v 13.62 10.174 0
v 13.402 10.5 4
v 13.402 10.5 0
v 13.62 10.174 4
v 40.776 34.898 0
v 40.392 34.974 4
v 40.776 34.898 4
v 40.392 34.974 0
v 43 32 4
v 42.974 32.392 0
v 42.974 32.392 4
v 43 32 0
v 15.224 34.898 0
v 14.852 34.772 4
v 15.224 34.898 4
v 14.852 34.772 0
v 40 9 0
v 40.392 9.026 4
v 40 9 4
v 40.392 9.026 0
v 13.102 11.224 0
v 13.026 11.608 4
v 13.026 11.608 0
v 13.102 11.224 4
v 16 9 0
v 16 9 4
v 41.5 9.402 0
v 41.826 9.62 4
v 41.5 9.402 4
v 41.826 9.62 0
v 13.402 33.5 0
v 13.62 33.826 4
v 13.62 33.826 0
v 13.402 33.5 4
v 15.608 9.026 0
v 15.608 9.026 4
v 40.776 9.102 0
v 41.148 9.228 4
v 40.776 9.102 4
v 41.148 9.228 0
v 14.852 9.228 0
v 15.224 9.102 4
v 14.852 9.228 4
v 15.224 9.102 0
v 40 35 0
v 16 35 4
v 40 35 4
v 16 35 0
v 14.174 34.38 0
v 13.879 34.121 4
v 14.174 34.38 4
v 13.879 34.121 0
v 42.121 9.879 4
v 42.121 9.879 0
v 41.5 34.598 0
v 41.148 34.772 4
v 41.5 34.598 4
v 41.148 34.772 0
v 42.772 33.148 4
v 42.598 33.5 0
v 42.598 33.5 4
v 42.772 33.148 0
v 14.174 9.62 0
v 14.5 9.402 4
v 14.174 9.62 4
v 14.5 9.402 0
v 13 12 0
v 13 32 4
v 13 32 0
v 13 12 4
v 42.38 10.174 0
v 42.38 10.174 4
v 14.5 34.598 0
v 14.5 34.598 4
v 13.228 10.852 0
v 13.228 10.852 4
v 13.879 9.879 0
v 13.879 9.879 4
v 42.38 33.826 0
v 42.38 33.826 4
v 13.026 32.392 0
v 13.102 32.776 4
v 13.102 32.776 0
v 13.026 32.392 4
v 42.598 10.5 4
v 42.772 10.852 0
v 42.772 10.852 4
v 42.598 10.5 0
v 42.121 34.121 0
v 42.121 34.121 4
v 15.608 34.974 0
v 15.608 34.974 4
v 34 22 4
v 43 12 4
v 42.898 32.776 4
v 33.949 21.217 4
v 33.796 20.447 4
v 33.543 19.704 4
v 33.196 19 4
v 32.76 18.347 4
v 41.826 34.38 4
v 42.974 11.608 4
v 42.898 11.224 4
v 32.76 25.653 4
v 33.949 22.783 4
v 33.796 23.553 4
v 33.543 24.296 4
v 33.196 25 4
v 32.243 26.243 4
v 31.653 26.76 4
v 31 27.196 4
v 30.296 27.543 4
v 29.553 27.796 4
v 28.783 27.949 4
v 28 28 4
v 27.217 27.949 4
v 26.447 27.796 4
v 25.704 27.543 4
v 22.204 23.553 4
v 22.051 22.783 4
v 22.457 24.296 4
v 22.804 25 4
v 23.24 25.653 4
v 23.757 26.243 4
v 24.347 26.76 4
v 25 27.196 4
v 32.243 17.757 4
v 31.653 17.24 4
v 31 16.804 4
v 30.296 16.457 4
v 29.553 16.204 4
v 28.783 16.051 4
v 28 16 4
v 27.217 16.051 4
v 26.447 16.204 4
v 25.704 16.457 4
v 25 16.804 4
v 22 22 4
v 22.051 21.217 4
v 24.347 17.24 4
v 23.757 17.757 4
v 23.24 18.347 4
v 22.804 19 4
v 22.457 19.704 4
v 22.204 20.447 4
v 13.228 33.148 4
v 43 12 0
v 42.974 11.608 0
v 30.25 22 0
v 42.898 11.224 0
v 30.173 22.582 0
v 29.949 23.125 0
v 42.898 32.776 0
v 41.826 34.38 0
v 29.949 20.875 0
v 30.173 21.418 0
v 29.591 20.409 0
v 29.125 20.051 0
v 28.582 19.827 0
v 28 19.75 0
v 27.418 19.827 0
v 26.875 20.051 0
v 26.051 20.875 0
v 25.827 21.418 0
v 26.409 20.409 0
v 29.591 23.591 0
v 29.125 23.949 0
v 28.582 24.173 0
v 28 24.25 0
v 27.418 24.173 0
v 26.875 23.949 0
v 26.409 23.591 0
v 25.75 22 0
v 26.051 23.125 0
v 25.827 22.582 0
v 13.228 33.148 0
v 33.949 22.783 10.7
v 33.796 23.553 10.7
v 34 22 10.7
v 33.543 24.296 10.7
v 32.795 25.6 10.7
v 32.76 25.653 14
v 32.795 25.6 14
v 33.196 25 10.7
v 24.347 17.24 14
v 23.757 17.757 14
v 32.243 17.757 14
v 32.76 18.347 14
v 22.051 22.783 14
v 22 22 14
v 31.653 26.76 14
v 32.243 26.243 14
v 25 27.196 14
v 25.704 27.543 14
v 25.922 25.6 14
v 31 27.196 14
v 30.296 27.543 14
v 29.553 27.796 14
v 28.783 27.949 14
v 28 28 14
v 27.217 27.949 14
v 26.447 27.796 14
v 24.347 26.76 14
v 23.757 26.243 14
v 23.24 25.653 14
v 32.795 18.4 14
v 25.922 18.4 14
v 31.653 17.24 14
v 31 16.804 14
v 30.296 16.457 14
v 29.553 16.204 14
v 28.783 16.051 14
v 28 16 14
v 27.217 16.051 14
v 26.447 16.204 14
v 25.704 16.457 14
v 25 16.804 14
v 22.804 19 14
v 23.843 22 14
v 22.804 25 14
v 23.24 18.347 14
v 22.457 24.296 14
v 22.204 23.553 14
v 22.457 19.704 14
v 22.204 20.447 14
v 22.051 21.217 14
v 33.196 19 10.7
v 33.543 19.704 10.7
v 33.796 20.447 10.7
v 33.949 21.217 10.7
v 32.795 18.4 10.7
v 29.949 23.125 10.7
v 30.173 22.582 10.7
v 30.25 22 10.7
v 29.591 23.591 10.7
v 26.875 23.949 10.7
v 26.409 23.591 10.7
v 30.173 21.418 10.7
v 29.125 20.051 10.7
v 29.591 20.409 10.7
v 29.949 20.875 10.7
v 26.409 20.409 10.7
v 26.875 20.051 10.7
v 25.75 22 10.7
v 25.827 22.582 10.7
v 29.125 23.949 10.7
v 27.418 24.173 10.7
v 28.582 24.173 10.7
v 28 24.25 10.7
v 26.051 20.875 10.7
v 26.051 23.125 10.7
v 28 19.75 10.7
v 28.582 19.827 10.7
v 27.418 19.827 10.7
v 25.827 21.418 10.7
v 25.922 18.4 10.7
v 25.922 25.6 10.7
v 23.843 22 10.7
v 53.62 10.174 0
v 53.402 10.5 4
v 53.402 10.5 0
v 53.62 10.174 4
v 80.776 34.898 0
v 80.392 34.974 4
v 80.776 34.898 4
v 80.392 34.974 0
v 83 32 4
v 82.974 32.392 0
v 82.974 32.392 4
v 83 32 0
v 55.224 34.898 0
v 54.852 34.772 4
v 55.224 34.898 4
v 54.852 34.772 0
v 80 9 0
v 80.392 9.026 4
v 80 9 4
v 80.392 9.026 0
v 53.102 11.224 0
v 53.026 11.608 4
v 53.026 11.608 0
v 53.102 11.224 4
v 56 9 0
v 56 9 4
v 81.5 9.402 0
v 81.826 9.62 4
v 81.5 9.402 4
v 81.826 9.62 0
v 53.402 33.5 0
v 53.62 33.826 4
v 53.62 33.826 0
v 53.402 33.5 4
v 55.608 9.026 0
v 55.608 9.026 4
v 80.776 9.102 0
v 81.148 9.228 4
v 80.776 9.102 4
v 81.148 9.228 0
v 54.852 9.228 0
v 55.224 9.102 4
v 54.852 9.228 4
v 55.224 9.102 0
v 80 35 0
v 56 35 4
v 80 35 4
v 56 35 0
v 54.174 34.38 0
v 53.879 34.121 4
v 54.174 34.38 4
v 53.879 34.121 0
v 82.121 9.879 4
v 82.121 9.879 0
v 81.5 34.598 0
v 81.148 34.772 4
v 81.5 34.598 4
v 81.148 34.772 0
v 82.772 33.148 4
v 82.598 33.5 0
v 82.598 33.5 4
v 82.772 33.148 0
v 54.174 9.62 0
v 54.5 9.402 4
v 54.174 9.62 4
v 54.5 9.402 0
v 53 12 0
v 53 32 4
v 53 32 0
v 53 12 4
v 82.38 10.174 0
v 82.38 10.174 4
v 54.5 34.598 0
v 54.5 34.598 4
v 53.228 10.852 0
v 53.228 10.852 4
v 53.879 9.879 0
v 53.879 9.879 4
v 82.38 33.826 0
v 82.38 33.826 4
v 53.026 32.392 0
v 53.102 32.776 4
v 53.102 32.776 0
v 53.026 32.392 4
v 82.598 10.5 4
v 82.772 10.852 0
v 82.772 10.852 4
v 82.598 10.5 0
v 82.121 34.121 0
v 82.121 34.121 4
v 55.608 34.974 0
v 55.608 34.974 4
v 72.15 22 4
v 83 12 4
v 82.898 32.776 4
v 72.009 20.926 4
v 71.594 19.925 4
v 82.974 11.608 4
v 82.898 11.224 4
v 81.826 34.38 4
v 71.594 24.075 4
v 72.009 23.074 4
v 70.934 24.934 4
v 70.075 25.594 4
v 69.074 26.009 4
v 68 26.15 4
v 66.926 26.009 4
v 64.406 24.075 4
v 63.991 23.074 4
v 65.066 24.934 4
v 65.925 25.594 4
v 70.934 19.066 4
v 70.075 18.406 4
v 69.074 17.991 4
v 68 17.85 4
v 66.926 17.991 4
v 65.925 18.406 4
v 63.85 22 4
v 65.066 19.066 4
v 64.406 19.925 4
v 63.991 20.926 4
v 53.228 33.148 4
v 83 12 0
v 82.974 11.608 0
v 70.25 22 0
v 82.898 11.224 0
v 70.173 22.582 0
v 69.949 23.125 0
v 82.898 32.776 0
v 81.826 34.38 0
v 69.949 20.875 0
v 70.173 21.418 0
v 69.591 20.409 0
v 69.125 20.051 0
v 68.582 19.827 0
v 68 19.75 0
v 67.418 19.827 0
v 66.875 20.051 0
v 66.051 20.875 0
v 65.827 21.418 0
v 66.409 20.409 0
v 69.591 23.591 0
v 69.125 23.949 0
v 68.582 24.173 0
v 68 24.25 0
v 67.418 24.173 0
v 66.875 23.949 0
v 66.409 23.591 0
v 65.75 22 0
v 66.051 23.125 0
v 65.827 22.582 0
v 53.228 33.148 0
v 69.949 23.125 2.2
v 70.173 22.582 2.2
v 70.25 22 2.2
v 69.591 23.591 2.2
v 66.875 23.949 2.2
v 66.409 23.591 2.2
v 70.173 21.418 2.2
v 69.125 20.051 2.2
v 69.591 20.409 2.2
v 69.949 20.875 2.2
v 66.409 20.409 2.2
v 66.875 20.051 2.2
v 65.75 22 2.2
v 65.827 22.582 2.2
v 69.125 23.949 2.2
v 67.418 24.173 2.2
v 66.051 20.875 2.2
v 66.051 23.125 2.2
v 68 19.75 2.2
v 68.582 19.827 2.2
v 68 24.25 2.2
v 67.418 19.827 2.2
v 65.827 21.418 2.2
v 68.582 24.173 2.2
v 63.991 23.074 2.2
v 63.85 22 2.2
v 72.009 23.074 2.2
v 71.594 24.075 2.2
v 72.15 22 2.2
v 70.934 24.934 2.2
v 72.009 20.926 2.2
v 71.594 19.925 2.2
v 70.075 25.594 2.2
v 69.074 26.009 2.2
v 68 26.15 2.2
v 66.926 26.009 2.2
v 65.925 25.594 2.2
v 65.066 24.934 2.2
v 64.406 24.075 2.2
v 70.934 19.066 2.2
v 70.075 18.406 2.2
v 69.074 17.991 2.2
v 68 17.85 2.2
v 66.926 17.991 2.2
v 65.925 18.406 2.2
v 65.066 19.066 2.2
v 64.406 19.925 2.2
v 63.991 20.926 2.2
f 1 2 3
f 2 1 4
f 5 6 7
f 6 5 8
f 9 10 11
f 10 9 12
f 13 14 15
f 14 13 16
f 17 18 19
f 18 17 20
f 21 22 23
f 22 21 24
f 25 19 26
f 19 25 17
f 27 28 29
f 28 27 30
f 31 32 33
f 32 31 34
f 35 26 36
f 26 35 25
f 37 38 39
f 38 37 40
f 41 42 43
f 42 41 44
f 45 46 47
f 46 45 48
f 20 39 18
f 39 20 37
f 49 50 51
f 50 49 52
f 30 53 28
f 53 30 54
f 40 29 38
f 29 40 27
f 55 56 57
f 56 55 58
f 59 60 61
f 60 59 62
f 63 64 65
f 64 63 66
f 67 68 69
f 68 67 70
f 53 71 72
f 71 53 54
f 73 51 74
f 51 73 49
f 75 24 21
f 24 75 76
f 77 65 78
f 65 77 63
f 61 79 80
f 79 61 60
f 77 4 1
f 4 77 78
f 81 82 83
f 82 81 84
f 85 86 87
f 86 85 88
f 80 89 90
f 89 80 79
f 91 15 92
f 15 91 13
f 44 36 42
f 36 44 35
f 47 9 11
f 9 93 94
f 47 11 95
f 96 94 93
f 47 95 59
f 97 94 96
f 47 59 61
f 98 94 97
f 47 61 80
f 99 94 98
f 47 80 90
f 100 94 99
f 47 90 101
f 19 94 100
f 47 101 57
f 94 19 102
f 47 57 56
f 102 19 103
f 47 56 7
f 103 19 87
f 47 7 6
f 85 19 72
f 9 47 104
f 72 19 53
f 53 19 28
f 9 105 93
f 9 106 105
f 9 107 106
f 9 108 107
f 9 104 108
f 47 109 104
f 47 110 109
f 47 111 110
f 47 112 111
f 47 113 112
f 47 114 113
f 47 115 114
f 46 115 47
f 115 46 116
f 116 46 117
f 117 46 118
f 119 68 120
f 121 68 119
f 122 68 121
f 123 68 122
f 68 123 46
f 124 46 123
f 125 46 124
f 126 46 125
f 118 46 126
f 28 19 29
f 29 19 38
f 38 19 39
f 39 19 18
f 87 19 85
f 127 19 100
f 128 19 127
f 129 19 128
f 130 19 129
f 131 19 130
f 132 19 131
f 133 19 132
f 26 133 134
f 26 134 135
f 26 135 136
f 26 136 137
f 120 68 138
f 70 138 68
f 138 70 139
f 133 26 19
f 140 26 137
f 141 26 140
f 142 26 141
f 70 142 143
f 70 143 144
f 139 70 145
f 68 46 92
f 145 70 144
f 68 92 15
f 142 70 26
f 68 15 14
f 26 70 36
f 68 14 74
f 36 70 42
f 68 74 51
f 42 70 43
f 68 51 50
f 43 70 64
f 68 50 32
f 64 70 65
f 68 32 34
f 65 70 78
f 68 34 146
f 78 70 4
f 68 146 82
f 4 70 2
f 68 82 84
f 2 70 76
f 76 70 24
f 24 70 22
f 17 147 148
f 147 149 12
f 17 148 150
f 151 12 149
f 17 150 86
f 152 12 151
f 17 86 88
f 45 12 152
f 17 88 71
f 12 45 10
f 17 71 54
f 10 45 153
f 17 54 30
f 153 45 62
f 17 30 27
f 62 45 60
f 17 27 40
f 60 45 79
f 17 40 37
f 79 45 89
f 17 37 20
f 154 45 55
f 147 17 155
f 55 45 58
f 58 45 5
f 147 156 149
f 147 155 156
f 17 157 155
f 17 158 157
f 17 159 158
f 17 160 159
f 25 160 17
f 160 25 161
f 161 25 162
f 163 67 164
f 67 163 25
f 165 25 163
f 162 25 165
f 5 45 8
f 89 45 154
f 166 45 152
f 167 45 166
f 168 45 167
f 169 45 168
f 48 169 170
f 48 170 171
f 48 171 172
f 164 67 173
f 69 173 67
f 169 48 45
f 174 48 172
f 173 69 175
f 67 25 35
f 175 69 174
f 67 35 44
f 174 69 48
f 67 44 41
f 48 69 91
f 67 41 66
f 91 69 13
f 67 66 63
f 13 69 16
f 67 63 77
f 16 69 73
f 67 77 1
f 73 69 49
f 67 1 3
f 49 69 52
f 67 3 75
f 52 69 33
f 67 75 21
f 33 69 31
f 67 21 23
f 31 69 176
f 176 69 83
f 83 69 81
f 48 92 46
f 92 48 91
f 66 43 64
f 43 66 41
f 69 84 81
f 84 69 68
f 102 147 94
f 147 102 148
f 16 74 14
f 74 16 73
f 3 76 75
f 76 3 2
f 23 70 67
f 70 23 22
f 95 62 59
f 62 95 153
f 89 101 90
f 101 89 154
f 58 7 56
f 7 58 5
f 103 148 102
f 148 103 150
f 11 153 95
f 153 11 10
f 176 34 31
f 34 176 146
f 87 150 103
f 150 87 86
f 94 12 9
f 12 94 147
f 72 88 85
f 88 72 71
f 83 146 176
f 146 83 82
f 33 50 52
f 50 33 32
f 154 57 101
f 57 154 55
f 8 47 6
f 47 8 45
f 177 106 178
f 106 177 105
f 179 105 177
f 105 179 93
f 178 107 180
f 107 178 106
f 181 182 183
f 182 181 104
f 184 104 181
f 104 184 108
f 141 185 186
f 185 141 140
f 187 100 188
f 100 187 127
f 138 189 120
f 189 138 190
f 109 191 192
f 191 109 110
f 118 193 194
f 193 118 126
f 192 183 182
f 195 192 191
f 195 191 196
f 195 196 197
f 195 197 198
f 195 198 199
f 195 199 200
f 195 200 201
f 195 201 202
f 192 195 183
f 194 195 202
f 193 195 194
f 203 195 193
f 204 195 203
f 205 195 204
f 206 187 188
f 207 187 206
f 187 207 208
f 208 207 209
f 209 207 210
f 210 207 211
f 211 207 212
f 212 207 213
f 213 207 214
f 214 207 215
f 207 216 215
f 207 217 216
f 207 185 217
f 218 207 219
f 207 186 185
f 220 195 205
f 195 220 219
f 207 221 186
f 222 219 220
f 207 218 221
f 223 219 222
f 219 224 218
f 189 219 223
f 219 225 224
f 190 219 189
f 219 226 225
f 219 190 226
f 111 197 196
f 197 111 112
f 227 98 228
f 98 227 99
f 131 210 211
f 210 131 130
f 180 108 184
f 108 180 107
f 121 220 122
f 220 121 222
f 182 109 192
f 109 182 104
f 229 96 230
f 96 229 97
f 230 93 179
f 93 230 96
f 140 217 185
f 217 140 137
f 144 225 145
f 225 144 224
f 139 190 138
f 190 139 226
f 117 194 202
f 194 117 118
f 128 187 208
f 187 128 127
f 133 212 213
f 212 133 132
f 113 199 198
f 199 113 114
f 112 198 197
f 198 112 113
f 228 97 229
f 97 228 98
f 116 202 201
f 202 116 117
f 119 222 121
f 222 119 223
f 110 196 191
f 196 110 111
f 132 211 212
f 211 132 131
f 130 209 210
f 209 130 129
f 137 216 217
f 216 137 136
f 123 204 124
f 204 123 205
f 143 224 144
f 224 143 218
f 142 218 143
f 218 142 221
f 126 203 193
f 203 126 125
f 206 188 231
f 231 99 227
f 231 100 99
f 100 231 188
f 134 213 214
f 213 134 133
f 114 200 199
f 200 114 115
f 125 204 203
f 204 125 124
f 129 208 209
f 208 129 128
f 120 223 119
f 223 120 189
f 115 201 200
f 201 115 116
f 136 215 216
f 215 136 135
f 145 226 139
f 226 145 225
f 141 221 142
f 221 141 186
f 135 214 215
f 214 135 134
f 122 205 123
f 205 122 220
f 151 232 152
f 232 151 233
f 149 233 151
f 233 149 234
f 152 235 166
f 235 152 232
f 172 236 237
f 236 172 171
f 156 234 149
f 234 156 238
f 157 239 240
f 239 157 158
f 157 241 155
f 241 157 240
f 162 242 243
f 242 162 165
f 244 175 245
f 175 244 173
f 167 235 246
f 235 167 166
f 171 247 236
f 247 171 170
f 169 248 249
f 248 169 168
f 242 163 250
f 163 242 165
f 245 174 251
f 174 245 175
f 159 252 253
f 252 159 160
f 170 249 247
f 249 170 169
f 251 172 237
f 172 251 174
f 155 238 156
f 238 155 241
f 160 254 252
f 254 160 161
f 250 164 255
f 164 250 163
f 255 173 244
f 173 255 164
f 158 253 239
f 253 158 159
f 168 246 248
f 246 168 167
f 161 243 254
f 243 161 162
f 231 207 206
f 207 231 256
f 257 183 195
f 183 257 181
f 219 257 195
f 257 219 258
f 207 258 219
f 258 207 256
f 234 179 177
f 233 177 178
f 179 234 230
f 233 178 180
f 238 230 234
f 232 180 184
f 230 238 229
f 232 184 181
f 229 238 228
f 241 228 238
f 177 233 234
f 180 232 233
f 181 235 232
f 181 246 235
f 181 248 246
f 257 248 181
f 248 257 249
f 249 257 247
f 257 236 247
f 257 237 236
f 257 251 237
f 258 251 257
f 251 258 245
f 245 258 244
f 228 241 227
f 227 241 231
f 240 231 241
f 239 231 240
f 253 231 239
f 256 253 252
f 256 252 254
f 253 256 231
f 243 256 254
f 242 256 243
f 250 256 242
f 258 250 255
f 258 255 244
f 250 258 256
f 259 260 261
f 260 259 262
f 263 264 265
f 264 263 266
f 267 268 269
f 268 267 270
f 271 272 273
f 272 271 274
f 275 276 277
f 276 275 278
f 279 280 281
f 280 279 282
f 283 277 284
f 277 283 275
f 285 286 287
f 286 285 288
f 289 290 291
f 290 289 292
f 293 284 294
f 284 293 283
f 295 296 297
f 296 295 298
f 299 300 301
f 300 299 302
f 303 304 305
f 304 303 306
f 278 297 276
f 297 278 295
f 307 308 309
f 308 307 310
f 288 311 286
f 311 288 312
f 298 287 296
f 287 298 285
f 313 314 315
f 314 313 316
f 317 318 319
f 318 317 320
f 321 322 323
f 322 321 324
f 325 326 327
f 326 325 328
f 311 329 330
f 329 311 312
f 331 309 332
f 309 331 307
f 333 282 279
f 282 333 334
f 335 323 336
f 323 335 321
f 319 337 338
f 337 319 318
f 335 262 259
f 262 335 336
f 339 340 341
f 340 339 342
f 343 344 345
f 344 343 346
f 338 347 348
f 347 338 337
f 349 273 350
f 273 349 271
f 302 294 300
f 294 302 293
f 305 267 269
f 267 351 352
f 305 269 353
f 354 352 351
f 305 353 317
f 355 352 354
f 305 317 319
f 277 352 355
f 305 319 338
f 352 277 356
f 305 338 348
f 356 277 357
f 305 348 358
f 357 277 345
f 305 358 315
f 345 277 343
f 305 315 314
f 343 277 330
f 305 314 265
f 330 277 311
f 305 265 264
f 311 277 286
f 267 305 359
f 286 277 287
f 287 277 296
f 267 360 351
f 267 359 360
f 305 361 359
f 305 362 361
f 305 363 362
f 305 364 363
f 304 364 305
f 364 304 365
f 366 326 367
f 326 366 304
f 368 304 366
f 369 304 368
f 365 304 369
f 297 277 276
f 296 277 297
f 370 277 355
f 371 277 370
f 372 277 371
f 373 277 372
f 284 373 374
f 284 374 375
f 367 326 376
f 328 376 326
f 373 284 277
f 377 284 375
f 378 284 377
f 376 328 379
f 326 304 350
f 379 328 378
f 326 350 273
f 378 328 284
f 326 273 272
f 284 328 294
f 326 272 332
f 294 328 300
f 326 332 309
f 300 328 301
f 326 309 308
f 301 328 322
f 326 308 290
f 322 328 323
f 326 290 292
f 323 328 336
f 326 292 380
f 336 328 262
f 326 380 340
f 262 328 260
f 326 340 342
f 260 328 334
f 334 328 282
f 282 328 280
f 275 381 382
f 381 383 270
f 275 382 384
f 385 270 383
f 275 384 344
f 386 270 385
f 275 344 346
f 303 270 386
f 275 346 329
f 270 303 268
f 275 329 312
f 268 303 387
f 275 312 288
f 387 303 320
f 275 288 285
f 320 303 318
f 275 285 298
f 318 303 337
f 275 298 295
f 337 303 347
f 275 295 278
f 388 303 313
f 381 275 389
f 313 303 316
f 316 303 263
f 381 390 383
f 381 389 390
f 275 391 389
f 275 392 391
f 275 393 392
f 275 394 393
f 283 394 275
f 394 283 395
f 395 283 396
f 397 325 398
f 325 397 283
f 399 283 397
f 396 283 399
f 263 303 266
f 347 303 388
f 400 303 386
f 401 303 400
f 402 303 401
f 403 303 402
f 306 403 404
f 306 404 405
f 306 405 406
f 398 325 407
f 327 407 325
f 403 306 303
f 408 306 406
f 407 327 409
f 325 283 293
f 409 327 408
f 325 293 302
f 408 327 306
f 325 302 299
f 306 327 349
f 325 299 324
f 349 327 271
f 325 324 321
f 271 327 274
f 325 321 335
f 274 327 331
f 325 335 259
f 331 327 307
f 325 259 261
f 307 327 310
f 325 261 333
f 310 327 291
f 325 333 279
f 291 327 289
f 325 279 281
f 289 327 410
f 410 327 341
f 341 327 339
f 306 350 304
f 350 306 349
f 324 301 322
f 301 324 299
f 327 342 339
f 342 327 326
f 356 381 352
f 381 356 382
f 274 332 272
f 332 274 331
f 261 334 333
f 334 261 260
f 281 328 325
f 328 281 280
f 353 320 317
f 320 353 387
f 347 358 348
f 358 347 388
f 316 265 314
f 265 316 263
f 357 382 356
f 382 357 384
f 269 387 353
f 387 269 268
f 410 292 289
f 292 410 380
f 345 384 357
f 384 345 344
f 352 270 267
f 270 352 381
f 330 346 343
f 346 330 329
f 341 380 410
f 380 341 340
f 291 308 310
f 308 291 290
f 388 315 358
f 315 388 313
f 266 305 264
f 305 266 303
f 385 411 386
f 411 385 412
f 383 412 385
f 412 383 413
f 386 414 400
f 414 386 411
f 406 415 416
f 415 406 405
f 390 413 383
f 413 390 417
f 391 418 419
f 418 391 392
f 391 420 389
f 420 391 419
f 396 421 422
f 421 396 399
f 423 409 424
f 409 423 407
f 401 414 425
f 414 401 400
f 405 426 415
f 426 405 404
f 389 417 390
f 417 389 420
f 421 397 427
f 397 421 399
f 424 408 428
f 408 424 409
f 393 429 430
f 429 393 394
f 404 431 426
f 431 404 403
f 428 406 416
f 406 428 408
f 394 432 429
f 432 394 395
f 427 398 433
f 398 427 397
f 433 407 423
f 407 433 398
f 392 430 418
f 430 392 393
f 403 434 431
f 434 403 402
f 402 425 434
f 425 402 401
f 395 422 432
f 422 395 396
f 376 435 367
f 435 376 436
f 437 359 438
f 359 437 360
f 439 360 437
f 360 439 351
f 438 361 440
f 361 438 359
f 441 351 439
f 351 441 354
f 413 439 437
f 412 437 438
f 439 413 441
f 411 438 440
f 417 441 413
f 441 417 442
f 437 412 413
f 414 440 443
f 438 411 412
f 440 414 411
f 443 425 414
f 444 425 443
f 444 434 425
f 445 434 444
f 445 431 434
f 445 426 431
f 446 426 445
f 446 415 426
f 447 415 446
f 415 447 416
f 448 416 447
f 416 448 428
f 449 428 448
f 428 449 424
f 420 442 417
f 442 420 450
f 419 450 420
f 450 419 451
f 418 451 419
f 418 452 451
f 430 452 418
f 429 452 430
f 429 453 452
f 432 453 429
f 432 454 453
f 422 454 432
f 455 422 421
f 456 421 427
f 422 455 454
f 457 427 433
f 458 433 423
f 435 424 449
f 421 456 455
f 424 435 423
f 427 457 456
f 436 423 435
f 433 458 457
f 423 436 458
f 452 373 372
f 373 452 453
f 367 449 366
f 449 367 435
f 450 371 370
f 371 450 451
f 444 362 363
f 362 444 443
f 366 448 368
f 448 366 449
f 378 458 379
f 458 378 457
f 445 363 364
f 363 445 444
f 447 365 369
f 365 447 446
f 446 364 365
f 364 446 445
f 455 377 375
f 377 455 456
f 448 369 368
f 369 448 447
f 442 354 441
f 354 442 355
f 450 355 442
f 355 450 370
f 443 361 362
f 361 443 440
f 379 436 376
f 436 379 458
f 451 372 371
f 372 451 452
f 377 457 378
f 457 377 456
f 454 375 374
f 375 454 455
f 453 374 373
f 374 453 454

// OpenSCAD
/*
Sample 059: Schraubdom mit seitlicher Muttertasche — M4
Generated from the FDM Mechanical Sample Library.
Units: millimetres.

Override examples:
  openscad -o custom.stl -D 'view="plate"' -D 'render_fn=64' model.scad
  openscad -o preview.png -D 'view="assembly"' model.scad
*/
use <../../../library/fdm_mechanisms.scad>

render_fn = is_undef(render_fn) ? 48 : render_fn;
view = is_undef(view) ? "plate" : view;
$fn = render_fn;

sample_nuttrap_screw(
    view=view,
    screw_d=4.5,
    nut_flat=7.2,
    nut_h=3.3,
    head_d=8.3
);
